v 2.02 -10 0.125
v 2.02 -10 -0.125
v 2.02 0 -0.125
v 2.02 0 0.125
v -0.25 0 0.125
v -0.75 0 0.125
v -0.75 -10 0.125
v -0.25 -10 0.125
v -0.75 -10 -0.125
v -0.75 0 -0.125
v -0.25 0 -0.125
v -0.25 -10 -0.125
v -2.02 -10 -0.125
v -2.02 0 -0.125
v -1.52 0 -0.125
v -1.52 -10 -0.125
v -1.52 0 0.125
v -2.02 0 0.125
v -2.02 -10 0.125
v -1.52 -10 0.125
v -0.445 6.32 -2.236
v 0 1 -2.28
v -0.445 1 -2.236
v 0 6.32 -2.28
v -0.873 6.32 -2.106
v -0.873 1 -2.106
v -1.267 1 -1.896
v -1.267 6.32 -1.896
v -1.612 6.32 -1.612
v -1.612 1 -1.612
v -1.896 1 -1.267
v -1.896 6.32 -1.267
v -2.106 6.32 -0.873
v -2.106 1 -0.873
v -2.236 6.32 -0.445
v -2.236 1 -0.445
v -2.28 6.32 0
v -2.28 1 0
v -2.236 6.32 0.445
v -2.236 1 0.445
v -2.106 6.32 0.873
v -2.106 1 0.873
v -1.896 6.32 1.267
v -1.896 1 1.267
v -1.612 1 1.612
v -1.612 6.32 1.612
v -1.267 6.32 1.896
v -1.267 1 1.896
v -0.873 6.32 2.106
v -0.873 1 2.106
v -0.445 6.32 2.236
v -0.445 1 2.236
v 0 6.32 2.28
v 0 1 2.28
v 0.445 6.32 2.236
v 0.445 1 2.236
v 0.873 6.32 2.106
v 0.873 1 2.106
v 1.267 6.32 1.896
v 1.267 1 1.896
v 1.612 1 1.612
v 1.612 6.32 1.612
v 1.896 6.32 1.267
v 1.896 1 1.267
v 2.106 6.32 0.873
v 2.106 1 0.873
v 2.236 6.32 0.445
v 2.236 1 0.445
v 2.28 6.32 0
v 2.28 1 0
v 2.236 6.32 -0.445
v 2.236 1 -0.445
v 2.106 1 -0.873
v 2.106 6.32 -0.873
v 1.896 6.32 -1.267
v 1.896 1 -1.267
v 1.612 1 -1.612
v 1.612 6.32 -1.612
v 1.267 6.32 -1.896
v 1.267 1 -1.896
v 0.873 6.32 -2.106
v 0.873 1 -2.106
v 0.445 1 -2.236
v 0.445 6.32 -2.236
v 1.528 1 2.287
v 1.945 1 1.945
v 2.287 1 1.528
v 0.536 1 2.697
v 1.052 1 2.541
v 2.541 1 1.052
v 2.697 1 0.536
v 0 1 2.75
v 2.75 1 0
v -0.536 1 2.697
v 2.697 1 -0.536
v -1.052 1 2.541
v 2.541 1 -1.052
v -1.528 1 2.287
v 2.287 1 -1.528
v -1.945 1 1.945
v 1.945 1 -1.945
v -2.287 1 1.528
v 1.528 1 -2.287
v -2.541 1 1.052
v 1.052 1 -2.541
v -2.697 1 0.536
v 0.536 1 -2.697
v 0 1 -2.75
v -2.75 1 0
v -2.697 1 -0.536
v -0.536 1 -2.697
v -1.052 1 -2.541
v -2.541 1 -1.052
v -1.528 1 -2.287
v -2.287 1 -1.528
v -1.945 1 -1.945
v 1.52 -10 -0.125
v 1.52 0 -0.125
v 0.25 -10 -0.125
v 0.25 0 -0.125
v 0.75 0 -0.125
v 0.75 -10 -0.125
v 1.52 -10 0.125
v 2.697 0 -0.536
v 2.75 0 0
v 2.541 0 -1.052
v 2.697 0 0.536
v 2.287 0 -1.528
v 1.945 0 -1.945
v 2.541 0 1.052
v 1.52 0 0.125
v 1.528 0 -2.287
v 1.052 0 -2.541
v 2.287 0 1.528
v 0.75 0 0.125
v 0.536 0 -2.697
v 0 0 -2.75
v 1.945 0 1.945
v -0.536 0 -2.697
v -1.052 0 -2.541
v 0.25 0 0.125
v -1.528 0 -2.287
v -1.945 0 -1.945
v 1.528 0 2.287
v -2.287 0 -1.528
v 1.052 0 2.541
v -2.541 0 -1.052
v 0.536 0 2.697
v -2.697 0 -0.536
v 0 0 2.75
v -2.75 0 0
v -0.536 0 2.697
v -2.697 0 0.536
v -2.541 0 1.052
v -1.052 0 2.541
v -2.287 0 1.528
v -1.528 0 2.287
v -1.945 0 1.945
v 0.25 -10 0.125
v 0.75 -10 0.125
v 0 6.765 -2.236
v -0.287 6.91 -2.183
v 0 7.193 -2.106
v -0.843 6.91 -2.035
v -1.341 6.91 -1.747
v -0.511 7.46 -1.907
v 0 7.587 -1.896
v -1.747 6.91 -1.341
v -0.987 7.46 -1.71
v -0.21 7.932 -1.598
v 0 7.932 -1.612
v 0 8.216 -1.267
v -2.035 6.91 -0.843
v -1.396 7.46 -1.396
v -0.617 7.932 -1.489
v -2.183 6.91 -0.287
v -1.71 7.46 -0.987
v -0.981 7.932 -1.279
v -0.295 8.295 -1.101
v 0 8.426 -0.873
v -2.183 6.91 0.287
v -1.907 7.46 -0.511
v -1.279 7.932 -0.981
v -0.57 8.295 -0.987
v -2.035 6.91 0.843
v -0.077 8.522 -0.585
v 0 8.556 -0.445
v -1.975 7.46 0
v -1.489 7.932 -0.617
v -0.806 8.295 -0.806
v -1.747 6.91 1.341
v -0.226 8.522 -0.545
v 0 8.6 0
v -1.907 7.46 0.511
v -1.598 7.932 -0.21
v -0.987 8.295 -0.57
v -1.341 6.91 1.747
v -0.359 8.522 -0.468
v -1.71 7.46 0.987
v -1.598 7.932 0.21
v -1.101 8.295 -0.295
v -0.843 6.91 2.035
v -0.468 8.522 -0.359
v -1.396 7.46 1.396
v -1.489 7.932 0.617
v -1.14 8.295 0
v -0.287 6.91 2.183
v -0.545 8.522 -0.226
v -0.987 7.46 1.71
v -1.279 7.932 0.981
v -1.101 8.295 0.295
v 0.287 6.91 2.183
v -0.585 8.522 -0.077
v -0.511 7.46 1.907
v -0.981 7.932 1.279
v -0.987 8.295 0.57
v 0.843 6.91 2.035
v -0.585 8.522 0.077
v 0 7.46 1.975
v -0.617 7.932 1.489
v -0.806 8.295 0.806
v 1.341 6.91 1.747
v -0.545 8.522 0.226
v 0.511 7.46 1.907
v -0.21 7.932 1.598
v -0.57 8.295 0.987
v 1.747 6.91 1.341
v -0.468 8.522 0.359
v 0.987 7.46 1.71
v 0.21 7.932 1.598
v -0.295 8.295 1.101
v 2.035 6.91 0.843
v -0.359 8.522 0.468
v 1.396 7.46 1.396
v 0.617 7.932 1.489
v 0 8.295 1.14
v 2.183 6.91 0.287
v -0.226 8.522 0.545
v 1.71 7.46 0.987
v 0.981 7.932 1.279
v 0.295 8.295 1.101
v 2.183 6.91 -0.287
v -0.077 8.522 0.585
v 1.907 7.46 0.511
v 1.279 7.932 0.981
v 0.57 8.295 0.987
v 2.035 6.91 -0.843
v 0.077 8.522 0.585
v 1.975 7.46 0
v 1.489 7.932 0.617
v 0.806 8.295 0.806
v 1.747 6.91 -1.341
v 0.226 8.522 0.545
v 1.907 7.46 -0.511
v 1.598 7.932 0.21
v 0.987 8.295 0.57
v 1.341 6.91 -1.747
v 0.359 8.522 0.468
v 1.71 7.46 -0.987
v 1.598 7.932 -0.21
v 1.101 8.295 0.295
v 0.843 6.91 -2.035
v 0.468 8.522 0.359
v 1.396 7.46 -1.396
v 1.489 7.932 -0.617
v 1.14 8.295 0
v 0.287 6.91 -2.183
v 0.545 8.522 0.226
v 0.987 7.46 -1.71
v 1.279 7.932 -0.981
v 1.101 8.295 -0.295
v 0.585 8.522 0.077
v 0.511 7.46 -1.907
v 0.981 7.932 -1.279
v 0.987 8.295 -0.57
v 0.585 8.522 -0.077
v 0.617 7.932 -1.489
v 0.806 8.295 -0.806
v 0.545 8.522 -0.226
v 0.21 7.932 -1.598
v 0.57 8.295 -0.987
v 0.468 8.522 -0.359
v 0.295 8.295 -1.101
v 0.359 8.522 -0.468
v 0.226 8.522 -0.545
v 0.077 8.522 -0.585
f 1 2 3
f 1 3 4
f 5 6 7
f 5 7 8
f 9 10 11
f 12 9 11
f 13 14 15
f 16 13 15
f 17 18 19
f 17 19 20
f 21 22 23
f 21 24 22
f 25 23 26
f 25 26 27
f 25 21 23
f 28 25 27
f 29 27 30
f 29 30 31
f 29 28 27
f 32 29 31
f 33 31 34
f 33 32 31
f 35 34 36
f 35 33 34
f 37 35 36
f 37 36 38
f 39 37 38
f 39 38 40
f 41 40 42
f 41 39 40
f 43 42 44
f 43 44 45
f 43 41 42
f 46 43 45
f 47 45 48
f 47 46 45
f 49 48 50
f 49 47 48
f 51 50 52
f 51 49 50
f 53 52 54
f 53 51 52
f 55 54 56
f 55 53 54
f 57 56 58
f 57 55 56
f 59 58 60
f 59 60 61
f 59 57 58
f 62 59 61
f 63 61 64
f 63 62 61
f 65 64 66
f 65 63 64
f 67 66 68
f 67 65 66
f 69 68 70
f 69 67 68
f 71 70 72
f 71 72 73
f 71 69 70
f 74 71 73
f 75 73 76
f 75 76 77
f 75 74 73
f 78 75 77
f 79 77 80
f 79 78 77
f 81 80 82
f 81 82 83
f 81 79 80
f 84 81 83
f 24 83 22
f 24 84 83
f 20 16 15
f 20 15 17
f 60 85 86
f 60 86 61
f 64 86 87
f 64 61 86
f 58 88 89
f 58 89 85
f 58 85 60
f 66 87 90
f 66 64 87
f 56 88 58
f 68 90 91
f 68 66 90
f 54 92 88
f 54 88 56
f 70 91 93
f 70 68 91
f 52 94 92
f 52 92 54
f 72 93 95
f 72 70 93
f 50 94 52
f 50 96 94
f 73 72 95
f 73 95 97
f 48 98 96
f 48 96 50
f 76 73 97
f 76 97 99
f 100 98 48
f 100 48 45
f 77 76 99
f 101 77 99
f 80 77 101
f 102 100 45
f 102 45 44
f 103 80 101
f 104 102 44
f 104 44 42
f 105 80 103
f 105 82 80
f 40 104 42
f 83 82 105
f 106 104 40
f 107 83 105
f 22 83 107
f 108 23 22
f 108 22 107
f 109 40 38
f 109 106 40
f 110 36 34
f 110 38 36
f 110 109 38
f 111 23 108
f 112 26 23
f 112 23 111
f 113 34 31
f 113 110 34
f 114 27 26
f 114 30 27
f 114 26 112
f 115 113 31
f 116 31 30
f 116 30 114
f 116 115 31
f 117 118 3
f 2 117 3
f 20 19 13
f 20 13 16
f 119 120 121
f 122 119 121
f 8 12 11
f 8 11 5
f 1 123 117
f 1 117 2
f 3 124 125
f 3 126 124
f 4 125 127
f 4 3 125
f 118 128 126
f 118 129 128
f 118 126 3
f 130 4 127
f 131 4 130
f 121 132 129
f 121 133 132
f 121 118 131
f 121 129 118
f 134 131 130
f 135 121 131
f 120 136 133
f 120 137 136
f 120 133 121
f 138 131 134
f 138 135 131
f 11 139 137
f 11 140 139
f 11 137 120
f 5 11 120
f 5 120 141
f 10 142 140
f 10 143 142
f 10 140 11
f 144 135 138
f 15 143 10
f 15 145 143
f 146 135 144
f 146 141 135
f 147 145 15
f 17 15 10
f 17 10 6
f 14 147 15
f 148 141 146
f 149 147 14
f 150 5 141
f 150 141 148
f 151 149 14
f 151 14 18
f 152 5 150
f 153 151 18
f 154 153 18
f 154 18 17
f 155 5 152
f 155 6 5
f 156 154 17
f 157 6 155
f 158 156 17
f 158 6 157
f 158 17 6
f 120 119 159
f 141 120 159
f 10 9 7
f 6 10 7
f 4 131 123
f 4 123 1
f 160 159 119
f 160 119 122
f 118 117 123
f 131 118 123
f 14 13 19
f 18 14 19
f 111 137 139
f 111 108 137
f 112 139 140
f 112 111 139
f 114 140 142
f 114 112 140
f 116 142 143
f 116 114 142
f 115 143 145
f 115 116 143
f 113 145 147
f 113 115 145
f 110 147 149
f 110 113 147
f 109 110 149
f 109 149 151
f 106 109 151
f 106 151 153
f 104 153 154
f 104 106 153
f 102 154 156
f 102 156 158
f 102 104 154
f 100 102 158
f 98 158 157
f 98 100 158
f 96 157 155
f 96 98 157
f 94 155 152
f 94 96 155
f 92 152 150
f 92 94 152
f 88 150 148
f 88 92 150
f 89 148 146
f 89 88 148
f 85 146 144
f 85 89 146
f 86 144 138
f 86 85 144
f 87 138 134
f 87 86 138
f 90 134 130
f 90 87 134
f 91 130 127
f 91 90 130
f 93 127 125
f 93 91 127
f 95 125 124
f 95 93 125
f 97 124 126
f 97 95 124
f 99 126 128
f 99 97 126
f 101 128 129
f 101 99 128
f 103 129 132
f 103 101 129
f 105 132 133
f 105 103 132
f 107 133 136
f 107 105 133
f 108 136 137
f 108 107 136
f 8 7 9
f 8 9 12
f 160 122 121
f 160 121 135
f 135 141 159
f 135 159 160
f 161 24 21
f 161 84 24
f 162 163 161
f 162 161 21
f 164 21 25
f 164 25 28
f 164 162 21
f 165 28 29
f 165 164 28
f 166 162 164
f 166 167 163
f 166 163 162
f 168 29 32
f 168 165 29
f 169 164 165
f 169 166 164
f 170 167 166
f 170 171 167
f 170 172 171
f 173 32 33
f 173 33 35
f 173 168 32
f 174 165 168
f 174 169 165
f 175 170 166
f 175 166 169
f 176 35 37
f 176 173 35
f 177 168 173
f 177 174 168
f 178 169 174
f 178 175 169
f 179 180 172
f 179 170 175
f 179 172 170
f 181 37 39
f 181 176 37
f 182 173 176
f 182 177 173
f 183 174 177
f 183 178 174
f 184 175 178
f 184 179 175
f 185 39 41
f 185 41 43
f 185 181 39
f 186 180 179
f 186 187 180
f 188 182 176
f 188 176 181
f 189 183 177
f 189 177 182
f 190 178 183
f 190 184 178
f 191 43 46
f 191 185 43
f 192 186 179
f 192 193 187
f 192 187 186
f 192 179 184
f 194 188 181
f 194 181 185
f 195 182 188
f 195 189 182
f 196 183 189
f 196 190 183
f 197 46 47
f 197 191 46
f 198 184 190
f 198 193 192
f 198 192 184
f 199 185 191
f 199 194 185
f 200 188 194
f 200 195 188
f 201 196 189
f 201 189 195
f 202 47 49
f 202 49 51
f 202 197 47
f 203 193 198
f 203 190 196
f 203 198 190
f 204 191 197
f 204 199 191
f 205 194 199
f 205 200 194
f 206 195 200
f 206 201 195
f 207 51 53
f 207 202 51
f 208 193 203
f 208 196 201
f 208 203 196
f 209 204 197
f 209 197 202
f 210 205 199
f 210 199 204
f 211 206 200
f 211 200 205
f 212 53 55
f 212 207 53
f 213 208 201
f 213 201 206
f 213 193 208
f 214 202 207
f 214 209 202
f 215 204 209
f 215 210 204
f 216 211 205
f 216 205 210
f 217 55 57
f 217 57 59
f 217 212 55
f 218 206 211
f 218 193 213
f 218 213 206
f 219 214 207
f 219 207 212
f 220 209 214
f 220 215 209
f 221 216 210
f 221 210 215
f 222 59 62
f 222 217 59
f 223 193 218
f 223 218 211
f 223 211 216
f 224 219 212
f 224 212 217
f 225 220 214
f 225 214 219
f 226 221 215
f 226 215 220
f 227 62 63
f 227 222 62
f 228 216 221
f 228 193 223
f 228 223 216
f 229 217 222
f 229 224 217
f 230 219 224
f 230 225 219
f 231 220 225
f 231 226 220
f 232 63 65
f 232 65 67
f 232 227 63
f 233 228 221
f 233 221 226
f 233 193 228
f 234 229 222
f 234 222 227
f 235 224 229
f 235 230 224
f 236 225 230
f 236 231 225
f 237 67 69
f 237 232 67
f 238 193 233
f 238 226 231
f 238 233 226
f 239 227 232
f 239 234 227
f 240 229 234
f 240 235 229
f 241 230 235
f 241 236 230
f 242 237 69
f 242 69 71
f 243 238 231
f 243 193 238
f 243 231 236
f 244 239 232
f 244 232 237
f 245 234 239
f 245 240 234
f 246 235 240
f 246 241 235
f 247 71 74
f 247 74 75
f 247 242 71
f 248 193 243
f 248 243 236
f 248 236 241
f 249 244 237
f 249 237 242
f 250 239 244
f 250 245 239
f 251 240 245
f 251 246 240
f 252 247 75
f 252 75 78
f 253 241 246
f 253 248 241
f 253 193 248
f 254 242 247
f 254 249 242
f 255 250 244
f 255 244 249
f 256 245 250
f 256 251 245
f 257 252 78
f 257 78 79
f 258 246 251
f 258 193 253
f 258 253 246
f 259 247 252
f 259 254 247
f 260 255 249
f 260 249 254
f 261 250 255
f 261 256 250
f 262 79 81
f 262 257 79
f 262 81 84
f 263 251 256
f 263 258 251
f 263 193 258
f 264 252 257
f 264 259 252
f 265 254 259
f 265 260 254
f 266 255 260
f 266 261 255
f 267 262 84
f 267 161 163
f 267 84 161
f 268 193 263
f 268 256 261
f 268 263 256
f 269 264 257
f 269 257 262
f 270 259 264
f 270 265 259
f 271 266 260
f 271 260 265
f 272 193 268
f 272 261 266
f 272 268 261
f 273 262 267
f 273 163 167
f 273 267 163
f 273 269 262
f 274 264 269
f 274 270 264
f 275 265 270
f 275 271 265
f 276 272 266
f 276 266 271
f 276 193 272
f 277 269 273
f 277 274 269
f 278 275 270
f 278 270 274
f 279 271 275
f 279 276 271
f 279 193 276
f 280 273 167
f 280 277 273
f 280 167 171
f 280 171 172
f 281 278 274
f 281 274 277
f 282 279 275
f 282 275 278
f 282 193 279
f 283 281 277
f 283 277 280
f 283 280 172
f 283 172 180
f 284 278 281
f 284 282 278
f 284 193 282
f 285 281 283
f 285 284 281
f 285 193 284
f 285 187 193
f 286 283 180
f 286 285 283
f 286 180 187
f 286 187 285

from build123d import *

# Parameters (mm, degrees)
CROQUIS3_W              = 0.5
CROQUIS3_H              = 0.25
SALIENTE_EXTRUIR1_DEPTH = 10


with BuildPart() as part:
    # Croquis1 → Revolución1 (revolve)
    with BuildSketch(Plane.XY, mode=Mode.PRIVATE) as revoluci_n1_sk:
        with BuildLine():
            Line((0, 0), (-2.75, 0))
            Line((-2.75, 0), (-2.75, 1))
            Line((-2.75, 1), (-2.28, 1))
            Line((-2.28, 1), (-2.28, 6.32))
            ThreePointArc((-2.28, 6.32), (-1.612203461, 7.932203461), (0, 8.6))
            Line((0, 8.6), (0, 0))
        make_face()
    revolve(revoluci_n1_sk.sketch.rotate(Axis((0, -55.273367698, 0), (0, 1, 0)), 270), axis=Axis((0, -55.273367698, 0), (0, 1, 0)))

    # Croquis3 → Saliente-Extruir1 (add)
    with BuildSketch(Plane.XZ):
        with Locations((-0.5, 0)):
            Rectangle(CROQUIS3_W, CROQUIS3_H)
        with Locations((-1.77, 0)):
            Rectangle(CROQUIS3_W, CROQUIS3_H)
        with Locations((1.77, 0)):
            Rectangle(CROQUIS3_W, CROQUIS3_H)
        with Locations((0.5, 0)):
            Rectangle(CROQUIS3_W, CROQUIS3_H)
    extrude(amount=SALIENTE_EXTRUIR1_DEPTH)


solid = part.part
